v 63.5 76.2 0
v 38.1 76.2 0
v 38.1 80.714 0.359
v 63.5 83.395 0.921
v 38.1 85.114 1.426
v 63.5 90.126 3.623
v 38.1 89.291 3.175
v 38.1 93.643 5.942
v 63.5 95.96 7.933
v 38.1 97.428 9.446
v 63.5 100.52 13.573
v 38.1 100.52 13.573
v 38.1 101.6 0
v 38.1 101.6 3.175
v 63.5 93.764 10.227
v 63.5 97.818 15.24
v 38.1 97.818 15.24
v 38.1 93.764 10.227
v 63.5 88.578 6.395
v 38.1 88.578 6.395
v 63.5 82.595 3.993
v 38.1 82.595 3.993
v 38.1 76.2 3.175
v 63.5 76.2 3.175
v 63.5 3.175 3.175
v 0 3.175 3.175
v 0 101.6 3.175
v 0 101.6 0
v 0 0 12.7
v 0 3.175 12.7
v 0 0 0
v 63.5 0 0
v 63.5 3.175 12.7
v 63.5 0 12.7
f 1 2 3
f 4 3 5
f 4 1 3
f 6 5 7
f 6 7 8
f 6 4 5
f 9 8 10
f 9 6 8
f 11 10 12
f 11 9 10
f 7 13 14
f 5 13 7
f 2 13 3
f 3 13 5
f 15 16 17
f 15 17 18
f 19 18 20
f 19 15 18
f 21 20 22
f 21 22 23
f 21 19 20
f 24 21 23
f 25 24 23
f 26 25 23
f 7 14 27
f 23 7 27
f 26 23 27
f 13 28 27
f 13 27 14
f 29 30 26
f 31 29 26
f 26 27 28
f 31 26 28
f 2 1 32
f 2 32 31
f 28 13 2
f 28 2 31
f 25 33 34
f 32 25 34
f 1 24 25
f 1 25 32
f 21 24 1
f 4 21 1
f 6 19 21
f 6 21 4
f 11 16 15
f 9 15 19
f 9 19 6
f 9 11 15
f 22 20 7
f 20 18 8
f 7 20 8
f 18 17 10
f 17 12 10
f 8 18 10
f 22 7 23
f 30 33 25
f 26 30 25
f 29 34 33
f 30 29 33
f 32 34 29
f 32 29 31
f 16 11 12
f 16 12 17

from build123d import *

# Parameters (mm, degrees)
BOSS_EXTRUDE1_DEPTH = 3.175
BOSS_EXTRUDE2_DEPTH = 25.4
SKETCH4_W           = 12.7
SKETCH4_H           = 3.175
BOSS_EXTRUDE3_DEPTH = 63.5


with BuildPart() as part:
    # Sketch1 → Boss-Extrude1 (new body)
    with BuildSketch(Plane.XY):
        Polygon((0, 101.6), (38.1, 101.6), (38.1, 76.2), (63.5, 76.2), (63.5, 0), (0, 0), align=None)
    extrude(amount=BOSS_EXTRUDE1_DEPTH)

    # Sketch2 → Boss-Extrude2 (add)
    with BuildSketch(Plane(origin=(63.5, 0, 0), x_dir=(0, 0, -1), z_dir=(1, 0, 0))):
        with BuildLine():
            Line((-3.175, 76.2), (0, 76.2))
            ThreePointArc((0, 76.2), (-3.62295396, 90.12573242), (-13.573125, 100.520246123))
            Line((-13.573125, 100.520246123), (-15.24, 97.817996554))
            ThreePointArc((-15.24, 97.817996554), (-6.39540352, 88.578428818), (-3.175, 76.2))
        make_face()
    extrude(amount=-BOSS_EXTRUDE2_DEPTH)

    # Sketch4 → Boss-Extrude3 (add)
    with BuildSketch(Plane(origin=(63.5, 0, 0), x_dir=(0, 0, -1), z_dir=(1, 0, 0))):
        with Locations((-6.35, 1.5875)):
            Rectangle(SKETCH4_W, SKETCH4_H)
    extrude(amount=-BOSS_EXTRUDE3_DEPTH)


solid = part.part
